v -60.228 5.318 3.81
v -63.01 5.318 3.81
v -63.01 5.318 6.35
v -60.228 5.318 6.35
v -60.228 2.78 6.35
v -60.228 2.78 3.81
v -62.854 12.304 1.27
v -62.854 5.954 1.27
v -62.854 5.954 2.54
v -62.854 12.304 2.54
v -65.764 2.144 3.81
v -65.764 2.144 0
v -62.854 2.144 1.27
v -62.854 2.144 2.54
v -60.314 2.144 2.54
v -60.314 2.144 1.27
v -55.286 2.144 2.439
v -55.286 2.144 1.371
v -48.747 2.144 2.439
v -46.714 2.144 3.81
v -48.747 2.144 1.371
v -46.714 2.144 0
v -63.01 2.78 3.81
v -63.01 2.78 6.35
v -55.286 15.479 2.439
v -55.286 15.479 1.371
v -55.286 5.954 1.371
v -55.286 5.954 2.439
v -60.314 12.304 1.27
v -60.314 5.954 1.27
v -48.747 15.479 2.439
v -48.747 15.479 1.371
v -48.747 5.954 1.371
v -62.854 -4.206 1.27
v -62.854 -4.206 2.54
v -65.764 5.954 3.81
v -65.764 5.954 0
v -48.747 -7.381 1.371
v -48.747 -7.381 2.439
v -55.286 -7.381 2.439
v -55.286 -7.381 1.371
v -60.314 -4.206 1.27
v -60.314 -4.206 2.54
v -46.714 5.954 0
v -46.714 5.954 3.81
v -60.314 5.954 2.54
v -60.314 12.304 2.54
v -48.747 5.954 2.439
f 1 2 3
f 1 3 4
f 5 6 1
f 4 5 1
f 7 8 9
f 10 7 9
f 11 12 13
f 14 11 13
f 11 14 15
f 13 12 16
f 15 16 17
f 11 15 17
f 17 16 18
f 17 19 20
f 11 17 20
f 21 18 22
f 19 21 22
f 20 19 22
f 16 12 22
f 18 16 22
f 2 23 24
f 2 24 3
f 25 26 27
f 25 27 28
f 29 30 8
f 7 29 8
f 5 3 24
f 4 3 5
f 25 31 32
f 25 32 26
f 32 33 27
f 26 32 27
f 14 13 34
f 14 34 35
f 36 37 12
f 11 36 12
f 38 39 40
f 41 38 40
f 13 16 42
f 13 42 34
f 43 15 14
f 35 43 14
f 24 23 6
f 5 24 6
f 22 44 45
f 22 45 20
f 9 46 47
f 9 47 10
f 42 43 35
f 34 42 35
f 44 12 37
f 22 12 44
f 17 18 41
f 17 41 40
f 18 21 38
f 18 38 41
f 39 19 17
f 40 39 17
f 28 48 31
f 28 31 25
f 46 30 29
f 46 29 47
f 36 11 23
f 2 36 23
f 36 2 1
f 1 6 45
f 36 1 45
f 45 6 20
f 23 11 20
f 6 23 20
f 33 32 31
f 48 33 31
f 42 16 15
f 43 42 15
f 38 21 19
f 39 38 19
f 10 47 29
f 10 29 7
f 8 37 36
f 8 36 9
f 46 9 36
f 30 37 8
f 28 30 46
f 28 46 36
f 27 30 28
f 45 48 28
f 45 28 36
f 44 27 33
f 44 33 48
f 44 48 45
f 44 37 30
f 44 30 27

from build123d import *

# Parameters (mm, degrees)
F0_W     = 19.05
F0_H     = 1.905
F1_DEPTH = 3.81
F2_W     = 6.538586
F2_H     = 1.067244
F3_DEPTH = 9.525
F4_W     = 2.54
F4_H     = 1.27
F5_DEPTH = 6.35
F6_W     = 2.782095
F6_H     = 1.268995
F7_DEPTH = 2.54


with BuildPart() as f1:
    # F0 (on Top) → F1 (new body)
    with BuildSketch(Plane.XY):
        with Locations((-56.238926, 5.001349)):
            Rectangle(F0_W, F0_H)
    extrude(amount=F1_DEPTH)

    # F2 (on face) → F3 (join)
    with BuildSketch(Plane(origin=(0, 5.953849, 0), x_dir=(-1, 0, 0), z_dir=(0, 1, 0))):
        with Locations((52.016381, 1.905)):
            Rectangle(F2_W, F2_H)
    extrude(amount=F3_DEPTH)

    # F4 (on face) → F5 (join)
    with BuildSketch(Plane(origin=(0, 5.953849, 0), x_dir=(-1, 0, 0), z_dir=(0, 1, 0))):
        with Locations((61.58399, 1.905)):
            Rectangle(F4_W, F4_H)
    extrude(amount=F5_DEPTH)

    # F6 (on face) → F7 (join)
    with BuildSketch(Plane.XY.offset(3.81)):
        with Locations((-61.618646, 4.683346)):
            Rectangle(F6_W, F6_H)
    extrude(amount=F7_DEPTH)

    # F8: F1 across face


with BuildPart() as f1_1:
    add(f1.part)
    add(f1.part.mirror(Plane(origin=(-56.716231, 4.048849, 2.186695), x_dir=(1, 0, 0), z_dir=(0, -1, 0))))


solid = f1_1.part
